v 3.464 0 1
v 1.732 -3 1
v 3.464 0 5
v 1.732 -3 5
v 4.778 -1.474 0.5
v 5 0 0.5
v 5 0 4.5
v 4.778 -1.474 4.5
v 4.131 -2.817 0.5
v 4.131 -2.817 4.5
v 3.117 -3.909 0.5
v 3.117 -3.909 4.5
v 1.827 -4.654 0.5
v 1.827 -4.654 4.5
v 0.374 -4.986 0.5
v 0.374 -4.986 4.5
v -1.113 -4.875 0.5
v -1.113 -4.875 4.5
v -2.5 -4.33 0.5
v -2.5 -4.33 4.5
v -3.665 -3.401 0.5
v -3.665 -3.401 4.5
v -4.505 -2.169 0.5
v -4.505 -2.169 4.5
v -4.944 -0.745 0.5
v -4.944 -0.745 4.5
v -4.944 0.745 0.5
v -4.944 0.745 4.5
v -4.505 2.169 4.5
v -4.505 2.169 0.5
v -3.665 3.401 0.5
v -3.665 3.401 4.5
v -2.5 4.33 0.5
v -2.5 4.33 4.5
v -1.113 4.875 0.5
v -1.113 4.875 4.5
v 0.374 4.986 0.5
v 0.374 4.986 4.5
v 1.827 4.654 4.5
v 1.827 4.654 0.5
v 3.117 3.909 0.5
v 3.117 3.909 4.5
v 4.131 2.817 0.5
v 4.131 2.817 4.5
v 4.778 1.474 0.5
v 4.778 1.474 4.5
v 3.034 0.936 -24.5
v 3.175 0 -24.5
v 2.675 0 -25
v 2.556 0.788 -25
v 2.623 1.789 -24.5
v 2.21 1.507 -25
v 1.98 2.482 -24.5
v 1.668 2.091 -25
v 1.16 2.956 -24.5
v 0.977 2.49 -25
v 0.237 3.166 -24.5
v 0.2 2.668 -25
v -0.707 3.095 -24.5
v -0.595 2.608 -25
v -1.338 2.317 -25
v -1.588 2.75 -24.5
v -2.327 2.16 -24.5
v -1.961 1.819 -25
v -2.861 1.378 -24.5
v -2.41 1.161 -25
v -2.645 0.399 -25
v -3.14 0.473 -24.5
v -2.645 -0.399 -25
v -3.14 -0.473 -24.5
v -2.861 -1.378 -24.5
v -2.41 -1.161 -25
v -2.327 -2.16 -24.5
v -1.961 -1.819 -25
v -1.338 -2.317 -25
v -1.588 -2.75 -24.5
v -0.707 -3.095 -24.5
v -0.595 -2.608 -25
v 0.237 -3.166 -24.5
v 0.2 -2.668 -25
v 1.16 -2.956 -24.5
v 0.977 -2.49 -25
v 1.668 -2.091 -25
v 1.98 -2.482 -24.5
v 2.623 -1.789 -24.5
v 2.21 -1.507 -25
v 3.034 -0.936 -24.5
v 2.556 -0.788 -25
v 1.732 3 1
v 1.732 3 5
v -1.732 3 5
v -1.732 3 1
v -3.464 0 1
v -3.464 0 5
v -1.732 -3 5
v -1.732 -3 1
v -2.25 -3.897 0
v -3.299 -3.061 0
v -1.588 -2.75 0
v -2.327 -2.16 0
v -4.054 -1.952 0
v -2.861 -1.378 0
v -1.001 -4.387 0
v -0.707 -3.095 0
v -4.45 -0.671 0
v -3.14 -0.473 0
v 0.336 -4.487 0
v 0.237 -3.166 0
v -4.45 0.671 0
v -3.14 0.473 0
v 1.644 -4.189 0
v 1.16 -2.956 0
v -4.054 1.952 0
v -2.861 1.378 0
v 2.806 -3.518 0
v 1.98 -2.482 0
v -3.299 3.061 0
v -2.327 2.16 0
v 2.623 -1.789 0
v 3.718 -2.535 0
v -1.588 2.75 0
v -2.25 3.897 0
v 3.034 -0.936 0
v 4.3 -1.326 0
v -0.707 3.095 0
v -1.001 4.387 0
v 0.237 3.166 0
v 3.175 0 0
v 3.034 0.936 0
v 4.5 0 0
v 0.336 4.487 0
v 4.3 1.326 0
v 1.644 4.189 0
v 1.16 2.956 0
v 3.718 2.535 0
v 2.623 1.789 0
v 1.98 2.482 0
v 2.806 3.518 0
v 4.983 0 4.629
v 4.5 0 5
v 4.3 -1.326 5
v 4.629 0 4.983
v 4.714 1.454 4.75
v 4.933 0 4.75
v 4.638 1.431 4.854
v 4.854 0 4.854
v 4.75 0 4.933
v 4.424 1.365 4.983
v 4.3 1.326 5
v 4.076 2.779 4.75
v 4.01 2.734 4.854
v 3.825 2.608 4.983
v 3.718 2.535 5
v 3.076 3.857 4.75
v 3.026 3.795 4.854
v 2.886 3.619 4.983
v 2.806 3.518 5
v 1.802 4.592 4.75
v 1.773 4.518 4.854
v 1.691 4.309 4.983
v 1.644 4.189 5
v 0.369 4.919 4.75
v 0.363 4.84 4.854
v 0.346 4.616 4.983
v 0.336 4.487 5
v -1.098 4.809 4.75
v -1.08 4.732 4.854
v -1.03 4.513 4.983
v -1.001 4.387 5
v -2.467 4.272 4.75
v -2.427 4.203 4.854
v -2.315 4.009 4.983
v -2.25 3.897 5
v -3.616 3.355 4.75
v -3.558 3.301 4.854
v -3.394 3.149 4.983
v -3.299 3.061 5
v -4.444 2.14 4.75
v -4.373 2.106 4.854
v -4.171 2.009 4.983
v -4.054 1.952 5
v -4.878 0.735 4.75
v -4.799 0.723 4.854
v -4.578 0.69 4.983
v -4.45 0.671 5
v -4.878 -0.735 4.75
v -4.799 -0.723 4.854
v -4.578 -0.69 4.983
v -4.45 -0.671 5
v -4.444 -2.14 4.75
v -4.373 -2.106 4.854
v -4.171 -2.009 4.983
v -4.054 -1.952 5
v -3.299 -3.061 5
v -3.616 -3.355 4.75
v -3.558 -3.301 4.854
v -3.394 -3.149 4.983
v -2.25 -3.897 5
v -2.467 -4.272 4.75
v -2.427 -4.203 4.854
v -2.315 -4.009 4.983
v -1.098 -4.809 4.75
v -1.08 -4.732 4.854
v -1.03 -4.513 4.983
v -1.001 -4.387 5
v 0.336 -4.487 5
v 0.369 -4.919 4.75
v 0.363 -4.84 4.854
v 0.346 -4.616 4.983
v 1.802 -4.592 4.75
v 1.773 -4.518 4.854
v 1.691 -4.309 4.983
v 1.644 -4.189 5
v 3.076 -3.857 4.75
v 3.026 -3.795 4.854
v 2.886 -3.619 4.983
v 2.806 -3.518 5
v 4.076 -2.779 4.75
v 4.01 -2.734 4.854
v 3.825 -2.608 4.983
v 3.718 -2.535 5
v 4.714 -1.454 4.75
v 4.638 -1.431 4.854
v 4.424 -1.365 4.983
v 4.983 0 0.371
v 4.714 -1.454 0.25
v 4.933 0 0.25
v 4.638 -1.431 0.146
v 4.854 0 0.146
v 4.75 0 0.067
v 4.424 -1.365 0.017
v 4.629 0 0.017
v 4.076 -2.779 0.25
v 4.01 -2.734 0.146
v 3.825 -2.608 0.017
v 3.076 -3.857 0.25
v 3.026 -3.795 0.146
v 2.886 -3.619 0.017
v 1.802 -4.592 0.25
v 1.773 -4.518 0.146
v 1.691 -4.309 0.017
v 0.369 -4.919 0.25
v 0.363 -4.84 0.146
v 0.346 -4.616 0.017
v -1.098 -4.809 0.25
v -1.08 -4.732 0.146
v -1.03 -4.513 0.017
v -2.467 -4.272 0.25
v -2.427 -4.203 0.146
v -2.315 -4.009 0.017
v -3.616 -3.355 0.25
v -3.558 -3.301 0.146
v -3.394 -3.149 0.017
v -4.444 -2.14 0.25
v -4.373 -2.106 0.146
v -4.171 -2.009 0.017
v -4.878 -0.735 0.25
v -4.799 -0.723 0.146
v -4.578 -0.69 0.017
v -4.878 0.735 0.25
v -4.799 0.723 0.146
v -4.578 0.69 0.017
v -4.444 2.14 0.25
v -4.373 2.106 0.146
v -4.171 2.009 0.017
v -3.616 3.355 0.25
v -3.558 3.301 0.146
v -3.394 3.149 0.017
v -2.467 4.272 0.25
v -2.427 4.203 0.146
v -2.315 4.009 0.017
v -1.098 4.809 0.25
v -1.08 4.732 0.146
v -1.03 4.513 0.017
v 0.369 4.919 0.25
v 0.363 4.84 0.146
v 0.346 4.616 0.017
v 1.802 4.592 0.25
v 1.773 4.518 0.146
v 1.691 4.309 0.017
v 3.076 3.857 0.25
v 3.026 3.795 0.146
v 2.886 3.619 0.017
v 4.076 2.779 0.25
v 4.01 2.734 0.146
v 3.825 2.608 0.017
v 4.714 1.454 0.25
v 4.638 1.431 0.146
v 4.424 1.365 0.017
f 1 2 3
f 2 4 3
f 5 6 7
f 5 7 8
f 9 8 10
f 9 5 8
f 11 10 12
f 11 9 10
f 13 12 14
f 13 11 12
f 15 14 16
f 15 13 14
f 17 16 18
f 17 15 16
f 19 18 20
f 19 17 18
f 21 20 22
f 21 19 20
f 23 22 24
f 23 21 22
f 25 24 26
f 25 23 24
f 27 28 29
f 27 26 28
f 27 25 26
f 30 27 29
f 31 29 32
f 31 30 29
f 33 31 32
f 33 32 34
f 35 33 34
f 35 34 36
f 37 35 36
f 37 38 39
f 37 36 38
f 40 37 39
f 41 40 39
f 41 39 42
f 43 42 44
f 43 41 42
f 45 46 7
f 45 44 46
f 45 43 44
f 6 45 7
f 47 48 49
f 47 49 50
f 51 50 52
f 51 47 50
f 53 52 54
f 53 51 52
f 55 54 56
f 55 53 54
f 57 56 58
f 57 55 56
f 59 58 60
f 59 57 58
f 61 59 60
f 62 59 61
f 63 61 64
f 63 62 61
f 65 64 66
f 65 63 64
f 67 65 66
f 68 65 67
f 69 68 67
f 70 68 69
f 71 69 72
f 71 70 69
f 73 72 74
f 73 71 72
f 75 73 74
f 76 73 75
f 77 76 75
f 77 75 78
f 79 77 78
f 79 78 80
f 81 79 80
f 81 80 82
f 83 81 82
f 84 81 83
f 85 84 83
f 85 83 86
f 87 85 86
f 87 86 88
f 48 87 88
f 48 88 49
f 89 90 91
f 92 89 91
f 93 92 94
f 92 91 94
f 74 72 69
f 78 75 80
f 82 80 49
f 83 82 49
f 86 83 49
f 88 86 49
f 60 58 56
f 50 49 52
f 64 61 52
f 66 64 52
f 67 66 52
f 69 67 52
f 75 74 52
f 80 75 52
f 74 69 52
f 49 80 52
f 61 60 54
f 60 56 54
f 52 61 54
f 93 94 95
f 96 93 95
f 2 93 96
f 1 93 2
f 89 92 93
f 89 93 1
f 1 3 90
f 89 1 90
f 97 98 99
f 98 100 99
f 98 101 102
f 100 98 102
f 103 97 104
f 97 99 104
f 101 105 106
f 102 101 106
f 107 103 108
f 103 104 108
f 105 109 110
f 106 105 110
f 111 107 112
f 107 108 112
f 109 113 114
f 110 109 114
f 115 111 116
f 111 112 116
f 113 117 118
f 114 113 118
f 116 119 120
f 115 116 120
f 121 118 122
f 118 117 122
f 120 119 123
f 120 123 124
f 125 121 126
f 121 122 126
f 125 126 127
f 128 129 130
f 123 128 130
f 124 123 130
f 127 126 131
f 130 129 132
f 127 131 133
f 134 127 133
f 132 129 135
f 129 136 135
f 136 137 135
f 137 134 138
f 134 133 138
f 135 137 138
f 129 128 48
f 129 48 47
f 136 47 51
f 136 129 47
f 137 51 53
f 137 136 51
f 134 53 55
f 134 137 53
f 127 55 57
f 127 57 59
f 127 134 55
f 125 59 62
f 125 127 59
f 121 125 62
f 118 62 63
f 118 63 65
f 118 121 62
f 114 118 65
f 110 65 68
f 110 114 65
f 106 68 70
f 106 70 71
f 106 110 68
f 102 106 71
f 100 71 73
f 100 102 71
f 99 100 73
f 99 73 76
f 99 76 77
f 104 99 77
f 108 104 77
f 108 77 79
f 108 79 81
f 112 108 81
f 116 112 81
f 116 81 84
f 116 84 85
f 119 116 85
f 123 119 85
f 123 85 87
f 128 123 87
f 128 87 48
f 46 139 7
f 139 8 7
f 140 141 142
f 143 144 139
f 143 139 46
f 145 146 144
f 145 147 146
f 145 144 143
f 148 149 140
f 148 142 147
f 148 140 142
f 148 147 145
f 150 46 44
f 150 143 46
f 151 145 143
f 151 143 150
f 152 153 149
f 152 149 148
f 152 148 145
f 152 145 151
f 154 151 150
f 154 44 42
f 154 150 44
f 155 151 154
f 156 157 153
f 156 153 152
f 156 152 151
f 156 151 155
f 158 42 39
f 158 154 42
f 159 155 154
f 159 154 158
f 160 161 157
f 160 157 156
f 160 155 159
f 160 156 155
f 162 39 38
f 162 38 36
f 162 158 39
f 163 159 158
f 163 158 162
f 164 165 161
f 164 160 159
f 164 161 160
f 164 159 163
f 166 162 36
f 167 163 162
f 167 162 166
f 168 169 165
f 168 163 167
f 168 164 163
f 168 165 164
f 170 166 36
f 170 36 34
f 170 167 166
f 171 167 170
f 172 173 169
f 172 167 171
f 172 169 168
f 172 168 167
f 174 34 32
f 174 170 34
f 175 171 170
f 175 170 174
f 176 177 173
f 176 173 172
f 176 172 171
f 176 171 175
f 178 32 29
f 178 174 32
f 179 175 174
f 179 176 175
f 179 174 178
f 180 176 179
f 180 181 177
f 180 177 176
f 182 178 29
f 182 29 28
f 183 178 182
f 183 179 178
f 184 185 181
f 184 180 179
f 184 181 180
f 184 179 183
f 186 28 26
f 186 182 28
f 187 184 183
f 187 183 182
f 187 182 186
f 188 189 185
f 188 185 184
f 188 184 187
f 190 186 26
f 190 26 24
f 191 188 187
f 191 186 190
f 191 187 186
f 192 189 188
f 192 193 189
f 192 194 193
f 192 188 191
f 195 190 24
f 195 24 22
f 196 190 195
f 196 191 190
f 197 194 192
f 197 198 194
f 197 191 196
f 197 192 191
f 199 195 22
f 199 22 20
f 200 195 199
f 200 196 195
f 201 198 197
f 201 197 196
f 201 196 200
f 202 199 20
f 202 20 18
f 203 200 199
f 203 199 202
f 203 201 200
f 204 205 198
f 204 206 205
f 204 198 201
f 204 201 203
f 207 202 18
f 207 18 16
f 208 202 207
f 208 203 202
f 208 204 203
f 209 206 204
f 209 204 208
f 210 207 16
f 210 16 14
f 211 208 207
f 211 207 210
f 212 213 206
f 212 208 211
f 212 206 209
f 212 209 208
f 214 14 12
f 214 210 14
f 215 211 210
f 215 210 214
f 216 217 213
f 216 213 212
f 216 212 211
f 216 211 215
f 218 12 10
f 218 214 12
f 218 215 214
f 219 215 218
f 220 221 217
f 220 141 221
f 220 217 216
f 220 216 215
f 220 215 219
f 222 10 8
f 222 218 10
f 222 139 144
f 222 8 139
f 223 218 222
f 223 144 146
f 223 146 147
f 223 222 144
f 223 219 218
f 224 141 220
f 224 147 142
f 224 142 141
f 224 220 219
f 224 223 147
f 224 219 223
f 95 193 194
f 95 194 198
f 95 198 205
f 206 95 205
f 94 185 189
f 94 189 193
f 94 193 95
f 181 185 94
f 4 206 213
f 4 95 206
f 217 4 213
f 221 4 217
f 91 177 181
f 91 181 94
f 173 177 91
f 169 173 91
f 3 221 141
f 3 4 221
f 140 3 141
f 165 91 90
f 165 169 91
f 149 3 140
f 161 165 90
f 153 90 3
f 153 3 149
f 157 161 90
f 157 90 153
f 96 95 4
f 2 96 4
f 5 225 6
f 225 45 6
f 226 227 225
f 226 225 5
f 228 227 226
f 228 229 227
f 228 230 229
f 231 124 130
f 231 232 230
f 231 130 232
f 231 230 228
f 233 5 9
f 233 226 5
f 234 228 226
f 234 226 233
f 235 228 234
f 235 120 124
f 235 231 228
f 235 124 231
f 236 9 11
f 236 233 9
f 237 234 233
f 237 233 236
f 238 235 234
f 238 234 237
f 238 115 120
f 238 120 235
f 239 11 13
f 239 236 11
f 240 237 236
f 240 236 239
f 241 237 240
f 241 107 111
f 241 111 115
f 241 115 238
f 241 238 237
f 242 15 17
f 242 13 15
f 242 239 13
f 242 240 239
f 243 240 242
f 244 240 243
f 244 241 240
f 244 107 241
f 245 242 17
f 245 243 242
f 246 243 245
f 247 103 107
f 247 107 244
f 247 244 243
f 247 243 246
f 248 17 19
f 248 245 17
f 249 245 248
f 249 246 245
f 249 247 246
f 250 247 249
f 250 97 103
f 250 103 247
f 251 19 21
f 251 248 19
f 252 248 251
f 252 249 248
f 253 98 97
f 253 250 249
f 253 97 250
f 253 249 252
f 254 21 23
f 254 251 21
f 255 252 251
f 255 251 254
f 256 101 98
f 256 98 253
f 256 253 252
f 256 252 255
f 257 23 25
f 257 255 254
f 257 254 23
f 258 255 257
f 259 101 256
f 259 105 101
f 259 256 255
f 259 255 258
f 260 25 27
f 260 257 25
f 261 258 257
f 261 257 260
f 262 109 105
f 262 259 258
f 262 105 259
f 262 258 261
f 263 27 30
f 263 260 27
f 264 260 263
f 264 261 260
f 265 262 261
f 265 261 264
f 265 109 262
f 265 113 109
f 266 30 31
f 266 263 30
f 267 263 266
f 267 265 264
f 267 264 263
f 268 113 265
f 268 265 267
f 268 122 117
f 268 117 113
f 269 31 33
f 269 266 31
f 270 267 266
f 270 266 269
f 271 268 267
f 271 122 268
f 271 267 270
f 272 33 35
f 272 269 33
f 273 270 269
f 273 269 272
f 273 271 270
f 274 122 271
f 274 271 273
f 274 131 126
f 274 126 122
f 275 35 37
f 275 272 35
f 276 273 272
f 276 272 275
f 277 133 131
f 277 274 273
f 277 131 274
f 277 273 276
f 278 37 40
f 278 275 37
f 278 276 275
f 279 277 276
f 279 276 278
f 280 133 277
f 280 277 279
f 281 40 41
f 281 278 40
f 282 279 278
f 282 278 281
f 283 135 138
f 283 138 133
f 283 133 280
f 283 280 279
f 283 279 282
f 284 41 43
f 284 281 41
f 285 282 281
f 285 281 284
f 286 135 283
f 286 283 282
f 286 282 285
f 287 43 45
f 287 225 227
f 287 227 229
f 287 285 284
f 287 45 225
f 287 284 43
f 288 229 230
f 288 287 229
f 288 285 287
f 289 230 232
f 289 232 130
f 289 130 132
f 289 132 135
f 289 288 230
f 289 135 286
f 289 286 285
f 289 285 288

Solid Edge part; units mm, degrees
sketch "Sketch1" plane through (0, 0, 0) normal (0, 0, 1) x (1, 0, 0)
  circle A0 centre (0, 0) radius 3.175
extrude "Protrusion1" add sketch "Sketch1" against normal blind 25
sketch "Sketch2" plane through (0, 0, 0) normal (0, 0, 1) x (1, 0, 0)
  circle A0 centre (0, 0) radius 5
extrude "ExtrudedProtrusion_2" add sketch "Sketch2" along normal blind 5
fillet "Round_1" radius 0.5 2 edges at (-5, 0, 5) (-5, 0, 0)
sketch "Sketch3" plane through (0, 0, 5) normal (0, 0, 1) x (1, 0, 0)
  line L0 (-1.7321, 3) -> (-3.4641, 0)
  line L1 (-3.4641, 0) -> (-1.7321, -3)
  line L2 (-1.7321, -3) -> (1.7321, -3)
  line L3 (1.7321, -3) -> (3.4641, 0)
  line L4 (3.4641, 0) -> (1.7321, 3)
  line L5 (1.7321, 3) -> (-1.7321, 3)
extrude "ExtrudedCutout_1" cut sketch "Sketch3" against normal blind 4
chamfer "Chamfer_1" distance 0.5 angle 45 1 edges at (-3.175, 0, -25) measured on face at (-2.1802, -2.0532, -25)
cosmetic_thread "Thread1" size "1/4-20 UNC"
